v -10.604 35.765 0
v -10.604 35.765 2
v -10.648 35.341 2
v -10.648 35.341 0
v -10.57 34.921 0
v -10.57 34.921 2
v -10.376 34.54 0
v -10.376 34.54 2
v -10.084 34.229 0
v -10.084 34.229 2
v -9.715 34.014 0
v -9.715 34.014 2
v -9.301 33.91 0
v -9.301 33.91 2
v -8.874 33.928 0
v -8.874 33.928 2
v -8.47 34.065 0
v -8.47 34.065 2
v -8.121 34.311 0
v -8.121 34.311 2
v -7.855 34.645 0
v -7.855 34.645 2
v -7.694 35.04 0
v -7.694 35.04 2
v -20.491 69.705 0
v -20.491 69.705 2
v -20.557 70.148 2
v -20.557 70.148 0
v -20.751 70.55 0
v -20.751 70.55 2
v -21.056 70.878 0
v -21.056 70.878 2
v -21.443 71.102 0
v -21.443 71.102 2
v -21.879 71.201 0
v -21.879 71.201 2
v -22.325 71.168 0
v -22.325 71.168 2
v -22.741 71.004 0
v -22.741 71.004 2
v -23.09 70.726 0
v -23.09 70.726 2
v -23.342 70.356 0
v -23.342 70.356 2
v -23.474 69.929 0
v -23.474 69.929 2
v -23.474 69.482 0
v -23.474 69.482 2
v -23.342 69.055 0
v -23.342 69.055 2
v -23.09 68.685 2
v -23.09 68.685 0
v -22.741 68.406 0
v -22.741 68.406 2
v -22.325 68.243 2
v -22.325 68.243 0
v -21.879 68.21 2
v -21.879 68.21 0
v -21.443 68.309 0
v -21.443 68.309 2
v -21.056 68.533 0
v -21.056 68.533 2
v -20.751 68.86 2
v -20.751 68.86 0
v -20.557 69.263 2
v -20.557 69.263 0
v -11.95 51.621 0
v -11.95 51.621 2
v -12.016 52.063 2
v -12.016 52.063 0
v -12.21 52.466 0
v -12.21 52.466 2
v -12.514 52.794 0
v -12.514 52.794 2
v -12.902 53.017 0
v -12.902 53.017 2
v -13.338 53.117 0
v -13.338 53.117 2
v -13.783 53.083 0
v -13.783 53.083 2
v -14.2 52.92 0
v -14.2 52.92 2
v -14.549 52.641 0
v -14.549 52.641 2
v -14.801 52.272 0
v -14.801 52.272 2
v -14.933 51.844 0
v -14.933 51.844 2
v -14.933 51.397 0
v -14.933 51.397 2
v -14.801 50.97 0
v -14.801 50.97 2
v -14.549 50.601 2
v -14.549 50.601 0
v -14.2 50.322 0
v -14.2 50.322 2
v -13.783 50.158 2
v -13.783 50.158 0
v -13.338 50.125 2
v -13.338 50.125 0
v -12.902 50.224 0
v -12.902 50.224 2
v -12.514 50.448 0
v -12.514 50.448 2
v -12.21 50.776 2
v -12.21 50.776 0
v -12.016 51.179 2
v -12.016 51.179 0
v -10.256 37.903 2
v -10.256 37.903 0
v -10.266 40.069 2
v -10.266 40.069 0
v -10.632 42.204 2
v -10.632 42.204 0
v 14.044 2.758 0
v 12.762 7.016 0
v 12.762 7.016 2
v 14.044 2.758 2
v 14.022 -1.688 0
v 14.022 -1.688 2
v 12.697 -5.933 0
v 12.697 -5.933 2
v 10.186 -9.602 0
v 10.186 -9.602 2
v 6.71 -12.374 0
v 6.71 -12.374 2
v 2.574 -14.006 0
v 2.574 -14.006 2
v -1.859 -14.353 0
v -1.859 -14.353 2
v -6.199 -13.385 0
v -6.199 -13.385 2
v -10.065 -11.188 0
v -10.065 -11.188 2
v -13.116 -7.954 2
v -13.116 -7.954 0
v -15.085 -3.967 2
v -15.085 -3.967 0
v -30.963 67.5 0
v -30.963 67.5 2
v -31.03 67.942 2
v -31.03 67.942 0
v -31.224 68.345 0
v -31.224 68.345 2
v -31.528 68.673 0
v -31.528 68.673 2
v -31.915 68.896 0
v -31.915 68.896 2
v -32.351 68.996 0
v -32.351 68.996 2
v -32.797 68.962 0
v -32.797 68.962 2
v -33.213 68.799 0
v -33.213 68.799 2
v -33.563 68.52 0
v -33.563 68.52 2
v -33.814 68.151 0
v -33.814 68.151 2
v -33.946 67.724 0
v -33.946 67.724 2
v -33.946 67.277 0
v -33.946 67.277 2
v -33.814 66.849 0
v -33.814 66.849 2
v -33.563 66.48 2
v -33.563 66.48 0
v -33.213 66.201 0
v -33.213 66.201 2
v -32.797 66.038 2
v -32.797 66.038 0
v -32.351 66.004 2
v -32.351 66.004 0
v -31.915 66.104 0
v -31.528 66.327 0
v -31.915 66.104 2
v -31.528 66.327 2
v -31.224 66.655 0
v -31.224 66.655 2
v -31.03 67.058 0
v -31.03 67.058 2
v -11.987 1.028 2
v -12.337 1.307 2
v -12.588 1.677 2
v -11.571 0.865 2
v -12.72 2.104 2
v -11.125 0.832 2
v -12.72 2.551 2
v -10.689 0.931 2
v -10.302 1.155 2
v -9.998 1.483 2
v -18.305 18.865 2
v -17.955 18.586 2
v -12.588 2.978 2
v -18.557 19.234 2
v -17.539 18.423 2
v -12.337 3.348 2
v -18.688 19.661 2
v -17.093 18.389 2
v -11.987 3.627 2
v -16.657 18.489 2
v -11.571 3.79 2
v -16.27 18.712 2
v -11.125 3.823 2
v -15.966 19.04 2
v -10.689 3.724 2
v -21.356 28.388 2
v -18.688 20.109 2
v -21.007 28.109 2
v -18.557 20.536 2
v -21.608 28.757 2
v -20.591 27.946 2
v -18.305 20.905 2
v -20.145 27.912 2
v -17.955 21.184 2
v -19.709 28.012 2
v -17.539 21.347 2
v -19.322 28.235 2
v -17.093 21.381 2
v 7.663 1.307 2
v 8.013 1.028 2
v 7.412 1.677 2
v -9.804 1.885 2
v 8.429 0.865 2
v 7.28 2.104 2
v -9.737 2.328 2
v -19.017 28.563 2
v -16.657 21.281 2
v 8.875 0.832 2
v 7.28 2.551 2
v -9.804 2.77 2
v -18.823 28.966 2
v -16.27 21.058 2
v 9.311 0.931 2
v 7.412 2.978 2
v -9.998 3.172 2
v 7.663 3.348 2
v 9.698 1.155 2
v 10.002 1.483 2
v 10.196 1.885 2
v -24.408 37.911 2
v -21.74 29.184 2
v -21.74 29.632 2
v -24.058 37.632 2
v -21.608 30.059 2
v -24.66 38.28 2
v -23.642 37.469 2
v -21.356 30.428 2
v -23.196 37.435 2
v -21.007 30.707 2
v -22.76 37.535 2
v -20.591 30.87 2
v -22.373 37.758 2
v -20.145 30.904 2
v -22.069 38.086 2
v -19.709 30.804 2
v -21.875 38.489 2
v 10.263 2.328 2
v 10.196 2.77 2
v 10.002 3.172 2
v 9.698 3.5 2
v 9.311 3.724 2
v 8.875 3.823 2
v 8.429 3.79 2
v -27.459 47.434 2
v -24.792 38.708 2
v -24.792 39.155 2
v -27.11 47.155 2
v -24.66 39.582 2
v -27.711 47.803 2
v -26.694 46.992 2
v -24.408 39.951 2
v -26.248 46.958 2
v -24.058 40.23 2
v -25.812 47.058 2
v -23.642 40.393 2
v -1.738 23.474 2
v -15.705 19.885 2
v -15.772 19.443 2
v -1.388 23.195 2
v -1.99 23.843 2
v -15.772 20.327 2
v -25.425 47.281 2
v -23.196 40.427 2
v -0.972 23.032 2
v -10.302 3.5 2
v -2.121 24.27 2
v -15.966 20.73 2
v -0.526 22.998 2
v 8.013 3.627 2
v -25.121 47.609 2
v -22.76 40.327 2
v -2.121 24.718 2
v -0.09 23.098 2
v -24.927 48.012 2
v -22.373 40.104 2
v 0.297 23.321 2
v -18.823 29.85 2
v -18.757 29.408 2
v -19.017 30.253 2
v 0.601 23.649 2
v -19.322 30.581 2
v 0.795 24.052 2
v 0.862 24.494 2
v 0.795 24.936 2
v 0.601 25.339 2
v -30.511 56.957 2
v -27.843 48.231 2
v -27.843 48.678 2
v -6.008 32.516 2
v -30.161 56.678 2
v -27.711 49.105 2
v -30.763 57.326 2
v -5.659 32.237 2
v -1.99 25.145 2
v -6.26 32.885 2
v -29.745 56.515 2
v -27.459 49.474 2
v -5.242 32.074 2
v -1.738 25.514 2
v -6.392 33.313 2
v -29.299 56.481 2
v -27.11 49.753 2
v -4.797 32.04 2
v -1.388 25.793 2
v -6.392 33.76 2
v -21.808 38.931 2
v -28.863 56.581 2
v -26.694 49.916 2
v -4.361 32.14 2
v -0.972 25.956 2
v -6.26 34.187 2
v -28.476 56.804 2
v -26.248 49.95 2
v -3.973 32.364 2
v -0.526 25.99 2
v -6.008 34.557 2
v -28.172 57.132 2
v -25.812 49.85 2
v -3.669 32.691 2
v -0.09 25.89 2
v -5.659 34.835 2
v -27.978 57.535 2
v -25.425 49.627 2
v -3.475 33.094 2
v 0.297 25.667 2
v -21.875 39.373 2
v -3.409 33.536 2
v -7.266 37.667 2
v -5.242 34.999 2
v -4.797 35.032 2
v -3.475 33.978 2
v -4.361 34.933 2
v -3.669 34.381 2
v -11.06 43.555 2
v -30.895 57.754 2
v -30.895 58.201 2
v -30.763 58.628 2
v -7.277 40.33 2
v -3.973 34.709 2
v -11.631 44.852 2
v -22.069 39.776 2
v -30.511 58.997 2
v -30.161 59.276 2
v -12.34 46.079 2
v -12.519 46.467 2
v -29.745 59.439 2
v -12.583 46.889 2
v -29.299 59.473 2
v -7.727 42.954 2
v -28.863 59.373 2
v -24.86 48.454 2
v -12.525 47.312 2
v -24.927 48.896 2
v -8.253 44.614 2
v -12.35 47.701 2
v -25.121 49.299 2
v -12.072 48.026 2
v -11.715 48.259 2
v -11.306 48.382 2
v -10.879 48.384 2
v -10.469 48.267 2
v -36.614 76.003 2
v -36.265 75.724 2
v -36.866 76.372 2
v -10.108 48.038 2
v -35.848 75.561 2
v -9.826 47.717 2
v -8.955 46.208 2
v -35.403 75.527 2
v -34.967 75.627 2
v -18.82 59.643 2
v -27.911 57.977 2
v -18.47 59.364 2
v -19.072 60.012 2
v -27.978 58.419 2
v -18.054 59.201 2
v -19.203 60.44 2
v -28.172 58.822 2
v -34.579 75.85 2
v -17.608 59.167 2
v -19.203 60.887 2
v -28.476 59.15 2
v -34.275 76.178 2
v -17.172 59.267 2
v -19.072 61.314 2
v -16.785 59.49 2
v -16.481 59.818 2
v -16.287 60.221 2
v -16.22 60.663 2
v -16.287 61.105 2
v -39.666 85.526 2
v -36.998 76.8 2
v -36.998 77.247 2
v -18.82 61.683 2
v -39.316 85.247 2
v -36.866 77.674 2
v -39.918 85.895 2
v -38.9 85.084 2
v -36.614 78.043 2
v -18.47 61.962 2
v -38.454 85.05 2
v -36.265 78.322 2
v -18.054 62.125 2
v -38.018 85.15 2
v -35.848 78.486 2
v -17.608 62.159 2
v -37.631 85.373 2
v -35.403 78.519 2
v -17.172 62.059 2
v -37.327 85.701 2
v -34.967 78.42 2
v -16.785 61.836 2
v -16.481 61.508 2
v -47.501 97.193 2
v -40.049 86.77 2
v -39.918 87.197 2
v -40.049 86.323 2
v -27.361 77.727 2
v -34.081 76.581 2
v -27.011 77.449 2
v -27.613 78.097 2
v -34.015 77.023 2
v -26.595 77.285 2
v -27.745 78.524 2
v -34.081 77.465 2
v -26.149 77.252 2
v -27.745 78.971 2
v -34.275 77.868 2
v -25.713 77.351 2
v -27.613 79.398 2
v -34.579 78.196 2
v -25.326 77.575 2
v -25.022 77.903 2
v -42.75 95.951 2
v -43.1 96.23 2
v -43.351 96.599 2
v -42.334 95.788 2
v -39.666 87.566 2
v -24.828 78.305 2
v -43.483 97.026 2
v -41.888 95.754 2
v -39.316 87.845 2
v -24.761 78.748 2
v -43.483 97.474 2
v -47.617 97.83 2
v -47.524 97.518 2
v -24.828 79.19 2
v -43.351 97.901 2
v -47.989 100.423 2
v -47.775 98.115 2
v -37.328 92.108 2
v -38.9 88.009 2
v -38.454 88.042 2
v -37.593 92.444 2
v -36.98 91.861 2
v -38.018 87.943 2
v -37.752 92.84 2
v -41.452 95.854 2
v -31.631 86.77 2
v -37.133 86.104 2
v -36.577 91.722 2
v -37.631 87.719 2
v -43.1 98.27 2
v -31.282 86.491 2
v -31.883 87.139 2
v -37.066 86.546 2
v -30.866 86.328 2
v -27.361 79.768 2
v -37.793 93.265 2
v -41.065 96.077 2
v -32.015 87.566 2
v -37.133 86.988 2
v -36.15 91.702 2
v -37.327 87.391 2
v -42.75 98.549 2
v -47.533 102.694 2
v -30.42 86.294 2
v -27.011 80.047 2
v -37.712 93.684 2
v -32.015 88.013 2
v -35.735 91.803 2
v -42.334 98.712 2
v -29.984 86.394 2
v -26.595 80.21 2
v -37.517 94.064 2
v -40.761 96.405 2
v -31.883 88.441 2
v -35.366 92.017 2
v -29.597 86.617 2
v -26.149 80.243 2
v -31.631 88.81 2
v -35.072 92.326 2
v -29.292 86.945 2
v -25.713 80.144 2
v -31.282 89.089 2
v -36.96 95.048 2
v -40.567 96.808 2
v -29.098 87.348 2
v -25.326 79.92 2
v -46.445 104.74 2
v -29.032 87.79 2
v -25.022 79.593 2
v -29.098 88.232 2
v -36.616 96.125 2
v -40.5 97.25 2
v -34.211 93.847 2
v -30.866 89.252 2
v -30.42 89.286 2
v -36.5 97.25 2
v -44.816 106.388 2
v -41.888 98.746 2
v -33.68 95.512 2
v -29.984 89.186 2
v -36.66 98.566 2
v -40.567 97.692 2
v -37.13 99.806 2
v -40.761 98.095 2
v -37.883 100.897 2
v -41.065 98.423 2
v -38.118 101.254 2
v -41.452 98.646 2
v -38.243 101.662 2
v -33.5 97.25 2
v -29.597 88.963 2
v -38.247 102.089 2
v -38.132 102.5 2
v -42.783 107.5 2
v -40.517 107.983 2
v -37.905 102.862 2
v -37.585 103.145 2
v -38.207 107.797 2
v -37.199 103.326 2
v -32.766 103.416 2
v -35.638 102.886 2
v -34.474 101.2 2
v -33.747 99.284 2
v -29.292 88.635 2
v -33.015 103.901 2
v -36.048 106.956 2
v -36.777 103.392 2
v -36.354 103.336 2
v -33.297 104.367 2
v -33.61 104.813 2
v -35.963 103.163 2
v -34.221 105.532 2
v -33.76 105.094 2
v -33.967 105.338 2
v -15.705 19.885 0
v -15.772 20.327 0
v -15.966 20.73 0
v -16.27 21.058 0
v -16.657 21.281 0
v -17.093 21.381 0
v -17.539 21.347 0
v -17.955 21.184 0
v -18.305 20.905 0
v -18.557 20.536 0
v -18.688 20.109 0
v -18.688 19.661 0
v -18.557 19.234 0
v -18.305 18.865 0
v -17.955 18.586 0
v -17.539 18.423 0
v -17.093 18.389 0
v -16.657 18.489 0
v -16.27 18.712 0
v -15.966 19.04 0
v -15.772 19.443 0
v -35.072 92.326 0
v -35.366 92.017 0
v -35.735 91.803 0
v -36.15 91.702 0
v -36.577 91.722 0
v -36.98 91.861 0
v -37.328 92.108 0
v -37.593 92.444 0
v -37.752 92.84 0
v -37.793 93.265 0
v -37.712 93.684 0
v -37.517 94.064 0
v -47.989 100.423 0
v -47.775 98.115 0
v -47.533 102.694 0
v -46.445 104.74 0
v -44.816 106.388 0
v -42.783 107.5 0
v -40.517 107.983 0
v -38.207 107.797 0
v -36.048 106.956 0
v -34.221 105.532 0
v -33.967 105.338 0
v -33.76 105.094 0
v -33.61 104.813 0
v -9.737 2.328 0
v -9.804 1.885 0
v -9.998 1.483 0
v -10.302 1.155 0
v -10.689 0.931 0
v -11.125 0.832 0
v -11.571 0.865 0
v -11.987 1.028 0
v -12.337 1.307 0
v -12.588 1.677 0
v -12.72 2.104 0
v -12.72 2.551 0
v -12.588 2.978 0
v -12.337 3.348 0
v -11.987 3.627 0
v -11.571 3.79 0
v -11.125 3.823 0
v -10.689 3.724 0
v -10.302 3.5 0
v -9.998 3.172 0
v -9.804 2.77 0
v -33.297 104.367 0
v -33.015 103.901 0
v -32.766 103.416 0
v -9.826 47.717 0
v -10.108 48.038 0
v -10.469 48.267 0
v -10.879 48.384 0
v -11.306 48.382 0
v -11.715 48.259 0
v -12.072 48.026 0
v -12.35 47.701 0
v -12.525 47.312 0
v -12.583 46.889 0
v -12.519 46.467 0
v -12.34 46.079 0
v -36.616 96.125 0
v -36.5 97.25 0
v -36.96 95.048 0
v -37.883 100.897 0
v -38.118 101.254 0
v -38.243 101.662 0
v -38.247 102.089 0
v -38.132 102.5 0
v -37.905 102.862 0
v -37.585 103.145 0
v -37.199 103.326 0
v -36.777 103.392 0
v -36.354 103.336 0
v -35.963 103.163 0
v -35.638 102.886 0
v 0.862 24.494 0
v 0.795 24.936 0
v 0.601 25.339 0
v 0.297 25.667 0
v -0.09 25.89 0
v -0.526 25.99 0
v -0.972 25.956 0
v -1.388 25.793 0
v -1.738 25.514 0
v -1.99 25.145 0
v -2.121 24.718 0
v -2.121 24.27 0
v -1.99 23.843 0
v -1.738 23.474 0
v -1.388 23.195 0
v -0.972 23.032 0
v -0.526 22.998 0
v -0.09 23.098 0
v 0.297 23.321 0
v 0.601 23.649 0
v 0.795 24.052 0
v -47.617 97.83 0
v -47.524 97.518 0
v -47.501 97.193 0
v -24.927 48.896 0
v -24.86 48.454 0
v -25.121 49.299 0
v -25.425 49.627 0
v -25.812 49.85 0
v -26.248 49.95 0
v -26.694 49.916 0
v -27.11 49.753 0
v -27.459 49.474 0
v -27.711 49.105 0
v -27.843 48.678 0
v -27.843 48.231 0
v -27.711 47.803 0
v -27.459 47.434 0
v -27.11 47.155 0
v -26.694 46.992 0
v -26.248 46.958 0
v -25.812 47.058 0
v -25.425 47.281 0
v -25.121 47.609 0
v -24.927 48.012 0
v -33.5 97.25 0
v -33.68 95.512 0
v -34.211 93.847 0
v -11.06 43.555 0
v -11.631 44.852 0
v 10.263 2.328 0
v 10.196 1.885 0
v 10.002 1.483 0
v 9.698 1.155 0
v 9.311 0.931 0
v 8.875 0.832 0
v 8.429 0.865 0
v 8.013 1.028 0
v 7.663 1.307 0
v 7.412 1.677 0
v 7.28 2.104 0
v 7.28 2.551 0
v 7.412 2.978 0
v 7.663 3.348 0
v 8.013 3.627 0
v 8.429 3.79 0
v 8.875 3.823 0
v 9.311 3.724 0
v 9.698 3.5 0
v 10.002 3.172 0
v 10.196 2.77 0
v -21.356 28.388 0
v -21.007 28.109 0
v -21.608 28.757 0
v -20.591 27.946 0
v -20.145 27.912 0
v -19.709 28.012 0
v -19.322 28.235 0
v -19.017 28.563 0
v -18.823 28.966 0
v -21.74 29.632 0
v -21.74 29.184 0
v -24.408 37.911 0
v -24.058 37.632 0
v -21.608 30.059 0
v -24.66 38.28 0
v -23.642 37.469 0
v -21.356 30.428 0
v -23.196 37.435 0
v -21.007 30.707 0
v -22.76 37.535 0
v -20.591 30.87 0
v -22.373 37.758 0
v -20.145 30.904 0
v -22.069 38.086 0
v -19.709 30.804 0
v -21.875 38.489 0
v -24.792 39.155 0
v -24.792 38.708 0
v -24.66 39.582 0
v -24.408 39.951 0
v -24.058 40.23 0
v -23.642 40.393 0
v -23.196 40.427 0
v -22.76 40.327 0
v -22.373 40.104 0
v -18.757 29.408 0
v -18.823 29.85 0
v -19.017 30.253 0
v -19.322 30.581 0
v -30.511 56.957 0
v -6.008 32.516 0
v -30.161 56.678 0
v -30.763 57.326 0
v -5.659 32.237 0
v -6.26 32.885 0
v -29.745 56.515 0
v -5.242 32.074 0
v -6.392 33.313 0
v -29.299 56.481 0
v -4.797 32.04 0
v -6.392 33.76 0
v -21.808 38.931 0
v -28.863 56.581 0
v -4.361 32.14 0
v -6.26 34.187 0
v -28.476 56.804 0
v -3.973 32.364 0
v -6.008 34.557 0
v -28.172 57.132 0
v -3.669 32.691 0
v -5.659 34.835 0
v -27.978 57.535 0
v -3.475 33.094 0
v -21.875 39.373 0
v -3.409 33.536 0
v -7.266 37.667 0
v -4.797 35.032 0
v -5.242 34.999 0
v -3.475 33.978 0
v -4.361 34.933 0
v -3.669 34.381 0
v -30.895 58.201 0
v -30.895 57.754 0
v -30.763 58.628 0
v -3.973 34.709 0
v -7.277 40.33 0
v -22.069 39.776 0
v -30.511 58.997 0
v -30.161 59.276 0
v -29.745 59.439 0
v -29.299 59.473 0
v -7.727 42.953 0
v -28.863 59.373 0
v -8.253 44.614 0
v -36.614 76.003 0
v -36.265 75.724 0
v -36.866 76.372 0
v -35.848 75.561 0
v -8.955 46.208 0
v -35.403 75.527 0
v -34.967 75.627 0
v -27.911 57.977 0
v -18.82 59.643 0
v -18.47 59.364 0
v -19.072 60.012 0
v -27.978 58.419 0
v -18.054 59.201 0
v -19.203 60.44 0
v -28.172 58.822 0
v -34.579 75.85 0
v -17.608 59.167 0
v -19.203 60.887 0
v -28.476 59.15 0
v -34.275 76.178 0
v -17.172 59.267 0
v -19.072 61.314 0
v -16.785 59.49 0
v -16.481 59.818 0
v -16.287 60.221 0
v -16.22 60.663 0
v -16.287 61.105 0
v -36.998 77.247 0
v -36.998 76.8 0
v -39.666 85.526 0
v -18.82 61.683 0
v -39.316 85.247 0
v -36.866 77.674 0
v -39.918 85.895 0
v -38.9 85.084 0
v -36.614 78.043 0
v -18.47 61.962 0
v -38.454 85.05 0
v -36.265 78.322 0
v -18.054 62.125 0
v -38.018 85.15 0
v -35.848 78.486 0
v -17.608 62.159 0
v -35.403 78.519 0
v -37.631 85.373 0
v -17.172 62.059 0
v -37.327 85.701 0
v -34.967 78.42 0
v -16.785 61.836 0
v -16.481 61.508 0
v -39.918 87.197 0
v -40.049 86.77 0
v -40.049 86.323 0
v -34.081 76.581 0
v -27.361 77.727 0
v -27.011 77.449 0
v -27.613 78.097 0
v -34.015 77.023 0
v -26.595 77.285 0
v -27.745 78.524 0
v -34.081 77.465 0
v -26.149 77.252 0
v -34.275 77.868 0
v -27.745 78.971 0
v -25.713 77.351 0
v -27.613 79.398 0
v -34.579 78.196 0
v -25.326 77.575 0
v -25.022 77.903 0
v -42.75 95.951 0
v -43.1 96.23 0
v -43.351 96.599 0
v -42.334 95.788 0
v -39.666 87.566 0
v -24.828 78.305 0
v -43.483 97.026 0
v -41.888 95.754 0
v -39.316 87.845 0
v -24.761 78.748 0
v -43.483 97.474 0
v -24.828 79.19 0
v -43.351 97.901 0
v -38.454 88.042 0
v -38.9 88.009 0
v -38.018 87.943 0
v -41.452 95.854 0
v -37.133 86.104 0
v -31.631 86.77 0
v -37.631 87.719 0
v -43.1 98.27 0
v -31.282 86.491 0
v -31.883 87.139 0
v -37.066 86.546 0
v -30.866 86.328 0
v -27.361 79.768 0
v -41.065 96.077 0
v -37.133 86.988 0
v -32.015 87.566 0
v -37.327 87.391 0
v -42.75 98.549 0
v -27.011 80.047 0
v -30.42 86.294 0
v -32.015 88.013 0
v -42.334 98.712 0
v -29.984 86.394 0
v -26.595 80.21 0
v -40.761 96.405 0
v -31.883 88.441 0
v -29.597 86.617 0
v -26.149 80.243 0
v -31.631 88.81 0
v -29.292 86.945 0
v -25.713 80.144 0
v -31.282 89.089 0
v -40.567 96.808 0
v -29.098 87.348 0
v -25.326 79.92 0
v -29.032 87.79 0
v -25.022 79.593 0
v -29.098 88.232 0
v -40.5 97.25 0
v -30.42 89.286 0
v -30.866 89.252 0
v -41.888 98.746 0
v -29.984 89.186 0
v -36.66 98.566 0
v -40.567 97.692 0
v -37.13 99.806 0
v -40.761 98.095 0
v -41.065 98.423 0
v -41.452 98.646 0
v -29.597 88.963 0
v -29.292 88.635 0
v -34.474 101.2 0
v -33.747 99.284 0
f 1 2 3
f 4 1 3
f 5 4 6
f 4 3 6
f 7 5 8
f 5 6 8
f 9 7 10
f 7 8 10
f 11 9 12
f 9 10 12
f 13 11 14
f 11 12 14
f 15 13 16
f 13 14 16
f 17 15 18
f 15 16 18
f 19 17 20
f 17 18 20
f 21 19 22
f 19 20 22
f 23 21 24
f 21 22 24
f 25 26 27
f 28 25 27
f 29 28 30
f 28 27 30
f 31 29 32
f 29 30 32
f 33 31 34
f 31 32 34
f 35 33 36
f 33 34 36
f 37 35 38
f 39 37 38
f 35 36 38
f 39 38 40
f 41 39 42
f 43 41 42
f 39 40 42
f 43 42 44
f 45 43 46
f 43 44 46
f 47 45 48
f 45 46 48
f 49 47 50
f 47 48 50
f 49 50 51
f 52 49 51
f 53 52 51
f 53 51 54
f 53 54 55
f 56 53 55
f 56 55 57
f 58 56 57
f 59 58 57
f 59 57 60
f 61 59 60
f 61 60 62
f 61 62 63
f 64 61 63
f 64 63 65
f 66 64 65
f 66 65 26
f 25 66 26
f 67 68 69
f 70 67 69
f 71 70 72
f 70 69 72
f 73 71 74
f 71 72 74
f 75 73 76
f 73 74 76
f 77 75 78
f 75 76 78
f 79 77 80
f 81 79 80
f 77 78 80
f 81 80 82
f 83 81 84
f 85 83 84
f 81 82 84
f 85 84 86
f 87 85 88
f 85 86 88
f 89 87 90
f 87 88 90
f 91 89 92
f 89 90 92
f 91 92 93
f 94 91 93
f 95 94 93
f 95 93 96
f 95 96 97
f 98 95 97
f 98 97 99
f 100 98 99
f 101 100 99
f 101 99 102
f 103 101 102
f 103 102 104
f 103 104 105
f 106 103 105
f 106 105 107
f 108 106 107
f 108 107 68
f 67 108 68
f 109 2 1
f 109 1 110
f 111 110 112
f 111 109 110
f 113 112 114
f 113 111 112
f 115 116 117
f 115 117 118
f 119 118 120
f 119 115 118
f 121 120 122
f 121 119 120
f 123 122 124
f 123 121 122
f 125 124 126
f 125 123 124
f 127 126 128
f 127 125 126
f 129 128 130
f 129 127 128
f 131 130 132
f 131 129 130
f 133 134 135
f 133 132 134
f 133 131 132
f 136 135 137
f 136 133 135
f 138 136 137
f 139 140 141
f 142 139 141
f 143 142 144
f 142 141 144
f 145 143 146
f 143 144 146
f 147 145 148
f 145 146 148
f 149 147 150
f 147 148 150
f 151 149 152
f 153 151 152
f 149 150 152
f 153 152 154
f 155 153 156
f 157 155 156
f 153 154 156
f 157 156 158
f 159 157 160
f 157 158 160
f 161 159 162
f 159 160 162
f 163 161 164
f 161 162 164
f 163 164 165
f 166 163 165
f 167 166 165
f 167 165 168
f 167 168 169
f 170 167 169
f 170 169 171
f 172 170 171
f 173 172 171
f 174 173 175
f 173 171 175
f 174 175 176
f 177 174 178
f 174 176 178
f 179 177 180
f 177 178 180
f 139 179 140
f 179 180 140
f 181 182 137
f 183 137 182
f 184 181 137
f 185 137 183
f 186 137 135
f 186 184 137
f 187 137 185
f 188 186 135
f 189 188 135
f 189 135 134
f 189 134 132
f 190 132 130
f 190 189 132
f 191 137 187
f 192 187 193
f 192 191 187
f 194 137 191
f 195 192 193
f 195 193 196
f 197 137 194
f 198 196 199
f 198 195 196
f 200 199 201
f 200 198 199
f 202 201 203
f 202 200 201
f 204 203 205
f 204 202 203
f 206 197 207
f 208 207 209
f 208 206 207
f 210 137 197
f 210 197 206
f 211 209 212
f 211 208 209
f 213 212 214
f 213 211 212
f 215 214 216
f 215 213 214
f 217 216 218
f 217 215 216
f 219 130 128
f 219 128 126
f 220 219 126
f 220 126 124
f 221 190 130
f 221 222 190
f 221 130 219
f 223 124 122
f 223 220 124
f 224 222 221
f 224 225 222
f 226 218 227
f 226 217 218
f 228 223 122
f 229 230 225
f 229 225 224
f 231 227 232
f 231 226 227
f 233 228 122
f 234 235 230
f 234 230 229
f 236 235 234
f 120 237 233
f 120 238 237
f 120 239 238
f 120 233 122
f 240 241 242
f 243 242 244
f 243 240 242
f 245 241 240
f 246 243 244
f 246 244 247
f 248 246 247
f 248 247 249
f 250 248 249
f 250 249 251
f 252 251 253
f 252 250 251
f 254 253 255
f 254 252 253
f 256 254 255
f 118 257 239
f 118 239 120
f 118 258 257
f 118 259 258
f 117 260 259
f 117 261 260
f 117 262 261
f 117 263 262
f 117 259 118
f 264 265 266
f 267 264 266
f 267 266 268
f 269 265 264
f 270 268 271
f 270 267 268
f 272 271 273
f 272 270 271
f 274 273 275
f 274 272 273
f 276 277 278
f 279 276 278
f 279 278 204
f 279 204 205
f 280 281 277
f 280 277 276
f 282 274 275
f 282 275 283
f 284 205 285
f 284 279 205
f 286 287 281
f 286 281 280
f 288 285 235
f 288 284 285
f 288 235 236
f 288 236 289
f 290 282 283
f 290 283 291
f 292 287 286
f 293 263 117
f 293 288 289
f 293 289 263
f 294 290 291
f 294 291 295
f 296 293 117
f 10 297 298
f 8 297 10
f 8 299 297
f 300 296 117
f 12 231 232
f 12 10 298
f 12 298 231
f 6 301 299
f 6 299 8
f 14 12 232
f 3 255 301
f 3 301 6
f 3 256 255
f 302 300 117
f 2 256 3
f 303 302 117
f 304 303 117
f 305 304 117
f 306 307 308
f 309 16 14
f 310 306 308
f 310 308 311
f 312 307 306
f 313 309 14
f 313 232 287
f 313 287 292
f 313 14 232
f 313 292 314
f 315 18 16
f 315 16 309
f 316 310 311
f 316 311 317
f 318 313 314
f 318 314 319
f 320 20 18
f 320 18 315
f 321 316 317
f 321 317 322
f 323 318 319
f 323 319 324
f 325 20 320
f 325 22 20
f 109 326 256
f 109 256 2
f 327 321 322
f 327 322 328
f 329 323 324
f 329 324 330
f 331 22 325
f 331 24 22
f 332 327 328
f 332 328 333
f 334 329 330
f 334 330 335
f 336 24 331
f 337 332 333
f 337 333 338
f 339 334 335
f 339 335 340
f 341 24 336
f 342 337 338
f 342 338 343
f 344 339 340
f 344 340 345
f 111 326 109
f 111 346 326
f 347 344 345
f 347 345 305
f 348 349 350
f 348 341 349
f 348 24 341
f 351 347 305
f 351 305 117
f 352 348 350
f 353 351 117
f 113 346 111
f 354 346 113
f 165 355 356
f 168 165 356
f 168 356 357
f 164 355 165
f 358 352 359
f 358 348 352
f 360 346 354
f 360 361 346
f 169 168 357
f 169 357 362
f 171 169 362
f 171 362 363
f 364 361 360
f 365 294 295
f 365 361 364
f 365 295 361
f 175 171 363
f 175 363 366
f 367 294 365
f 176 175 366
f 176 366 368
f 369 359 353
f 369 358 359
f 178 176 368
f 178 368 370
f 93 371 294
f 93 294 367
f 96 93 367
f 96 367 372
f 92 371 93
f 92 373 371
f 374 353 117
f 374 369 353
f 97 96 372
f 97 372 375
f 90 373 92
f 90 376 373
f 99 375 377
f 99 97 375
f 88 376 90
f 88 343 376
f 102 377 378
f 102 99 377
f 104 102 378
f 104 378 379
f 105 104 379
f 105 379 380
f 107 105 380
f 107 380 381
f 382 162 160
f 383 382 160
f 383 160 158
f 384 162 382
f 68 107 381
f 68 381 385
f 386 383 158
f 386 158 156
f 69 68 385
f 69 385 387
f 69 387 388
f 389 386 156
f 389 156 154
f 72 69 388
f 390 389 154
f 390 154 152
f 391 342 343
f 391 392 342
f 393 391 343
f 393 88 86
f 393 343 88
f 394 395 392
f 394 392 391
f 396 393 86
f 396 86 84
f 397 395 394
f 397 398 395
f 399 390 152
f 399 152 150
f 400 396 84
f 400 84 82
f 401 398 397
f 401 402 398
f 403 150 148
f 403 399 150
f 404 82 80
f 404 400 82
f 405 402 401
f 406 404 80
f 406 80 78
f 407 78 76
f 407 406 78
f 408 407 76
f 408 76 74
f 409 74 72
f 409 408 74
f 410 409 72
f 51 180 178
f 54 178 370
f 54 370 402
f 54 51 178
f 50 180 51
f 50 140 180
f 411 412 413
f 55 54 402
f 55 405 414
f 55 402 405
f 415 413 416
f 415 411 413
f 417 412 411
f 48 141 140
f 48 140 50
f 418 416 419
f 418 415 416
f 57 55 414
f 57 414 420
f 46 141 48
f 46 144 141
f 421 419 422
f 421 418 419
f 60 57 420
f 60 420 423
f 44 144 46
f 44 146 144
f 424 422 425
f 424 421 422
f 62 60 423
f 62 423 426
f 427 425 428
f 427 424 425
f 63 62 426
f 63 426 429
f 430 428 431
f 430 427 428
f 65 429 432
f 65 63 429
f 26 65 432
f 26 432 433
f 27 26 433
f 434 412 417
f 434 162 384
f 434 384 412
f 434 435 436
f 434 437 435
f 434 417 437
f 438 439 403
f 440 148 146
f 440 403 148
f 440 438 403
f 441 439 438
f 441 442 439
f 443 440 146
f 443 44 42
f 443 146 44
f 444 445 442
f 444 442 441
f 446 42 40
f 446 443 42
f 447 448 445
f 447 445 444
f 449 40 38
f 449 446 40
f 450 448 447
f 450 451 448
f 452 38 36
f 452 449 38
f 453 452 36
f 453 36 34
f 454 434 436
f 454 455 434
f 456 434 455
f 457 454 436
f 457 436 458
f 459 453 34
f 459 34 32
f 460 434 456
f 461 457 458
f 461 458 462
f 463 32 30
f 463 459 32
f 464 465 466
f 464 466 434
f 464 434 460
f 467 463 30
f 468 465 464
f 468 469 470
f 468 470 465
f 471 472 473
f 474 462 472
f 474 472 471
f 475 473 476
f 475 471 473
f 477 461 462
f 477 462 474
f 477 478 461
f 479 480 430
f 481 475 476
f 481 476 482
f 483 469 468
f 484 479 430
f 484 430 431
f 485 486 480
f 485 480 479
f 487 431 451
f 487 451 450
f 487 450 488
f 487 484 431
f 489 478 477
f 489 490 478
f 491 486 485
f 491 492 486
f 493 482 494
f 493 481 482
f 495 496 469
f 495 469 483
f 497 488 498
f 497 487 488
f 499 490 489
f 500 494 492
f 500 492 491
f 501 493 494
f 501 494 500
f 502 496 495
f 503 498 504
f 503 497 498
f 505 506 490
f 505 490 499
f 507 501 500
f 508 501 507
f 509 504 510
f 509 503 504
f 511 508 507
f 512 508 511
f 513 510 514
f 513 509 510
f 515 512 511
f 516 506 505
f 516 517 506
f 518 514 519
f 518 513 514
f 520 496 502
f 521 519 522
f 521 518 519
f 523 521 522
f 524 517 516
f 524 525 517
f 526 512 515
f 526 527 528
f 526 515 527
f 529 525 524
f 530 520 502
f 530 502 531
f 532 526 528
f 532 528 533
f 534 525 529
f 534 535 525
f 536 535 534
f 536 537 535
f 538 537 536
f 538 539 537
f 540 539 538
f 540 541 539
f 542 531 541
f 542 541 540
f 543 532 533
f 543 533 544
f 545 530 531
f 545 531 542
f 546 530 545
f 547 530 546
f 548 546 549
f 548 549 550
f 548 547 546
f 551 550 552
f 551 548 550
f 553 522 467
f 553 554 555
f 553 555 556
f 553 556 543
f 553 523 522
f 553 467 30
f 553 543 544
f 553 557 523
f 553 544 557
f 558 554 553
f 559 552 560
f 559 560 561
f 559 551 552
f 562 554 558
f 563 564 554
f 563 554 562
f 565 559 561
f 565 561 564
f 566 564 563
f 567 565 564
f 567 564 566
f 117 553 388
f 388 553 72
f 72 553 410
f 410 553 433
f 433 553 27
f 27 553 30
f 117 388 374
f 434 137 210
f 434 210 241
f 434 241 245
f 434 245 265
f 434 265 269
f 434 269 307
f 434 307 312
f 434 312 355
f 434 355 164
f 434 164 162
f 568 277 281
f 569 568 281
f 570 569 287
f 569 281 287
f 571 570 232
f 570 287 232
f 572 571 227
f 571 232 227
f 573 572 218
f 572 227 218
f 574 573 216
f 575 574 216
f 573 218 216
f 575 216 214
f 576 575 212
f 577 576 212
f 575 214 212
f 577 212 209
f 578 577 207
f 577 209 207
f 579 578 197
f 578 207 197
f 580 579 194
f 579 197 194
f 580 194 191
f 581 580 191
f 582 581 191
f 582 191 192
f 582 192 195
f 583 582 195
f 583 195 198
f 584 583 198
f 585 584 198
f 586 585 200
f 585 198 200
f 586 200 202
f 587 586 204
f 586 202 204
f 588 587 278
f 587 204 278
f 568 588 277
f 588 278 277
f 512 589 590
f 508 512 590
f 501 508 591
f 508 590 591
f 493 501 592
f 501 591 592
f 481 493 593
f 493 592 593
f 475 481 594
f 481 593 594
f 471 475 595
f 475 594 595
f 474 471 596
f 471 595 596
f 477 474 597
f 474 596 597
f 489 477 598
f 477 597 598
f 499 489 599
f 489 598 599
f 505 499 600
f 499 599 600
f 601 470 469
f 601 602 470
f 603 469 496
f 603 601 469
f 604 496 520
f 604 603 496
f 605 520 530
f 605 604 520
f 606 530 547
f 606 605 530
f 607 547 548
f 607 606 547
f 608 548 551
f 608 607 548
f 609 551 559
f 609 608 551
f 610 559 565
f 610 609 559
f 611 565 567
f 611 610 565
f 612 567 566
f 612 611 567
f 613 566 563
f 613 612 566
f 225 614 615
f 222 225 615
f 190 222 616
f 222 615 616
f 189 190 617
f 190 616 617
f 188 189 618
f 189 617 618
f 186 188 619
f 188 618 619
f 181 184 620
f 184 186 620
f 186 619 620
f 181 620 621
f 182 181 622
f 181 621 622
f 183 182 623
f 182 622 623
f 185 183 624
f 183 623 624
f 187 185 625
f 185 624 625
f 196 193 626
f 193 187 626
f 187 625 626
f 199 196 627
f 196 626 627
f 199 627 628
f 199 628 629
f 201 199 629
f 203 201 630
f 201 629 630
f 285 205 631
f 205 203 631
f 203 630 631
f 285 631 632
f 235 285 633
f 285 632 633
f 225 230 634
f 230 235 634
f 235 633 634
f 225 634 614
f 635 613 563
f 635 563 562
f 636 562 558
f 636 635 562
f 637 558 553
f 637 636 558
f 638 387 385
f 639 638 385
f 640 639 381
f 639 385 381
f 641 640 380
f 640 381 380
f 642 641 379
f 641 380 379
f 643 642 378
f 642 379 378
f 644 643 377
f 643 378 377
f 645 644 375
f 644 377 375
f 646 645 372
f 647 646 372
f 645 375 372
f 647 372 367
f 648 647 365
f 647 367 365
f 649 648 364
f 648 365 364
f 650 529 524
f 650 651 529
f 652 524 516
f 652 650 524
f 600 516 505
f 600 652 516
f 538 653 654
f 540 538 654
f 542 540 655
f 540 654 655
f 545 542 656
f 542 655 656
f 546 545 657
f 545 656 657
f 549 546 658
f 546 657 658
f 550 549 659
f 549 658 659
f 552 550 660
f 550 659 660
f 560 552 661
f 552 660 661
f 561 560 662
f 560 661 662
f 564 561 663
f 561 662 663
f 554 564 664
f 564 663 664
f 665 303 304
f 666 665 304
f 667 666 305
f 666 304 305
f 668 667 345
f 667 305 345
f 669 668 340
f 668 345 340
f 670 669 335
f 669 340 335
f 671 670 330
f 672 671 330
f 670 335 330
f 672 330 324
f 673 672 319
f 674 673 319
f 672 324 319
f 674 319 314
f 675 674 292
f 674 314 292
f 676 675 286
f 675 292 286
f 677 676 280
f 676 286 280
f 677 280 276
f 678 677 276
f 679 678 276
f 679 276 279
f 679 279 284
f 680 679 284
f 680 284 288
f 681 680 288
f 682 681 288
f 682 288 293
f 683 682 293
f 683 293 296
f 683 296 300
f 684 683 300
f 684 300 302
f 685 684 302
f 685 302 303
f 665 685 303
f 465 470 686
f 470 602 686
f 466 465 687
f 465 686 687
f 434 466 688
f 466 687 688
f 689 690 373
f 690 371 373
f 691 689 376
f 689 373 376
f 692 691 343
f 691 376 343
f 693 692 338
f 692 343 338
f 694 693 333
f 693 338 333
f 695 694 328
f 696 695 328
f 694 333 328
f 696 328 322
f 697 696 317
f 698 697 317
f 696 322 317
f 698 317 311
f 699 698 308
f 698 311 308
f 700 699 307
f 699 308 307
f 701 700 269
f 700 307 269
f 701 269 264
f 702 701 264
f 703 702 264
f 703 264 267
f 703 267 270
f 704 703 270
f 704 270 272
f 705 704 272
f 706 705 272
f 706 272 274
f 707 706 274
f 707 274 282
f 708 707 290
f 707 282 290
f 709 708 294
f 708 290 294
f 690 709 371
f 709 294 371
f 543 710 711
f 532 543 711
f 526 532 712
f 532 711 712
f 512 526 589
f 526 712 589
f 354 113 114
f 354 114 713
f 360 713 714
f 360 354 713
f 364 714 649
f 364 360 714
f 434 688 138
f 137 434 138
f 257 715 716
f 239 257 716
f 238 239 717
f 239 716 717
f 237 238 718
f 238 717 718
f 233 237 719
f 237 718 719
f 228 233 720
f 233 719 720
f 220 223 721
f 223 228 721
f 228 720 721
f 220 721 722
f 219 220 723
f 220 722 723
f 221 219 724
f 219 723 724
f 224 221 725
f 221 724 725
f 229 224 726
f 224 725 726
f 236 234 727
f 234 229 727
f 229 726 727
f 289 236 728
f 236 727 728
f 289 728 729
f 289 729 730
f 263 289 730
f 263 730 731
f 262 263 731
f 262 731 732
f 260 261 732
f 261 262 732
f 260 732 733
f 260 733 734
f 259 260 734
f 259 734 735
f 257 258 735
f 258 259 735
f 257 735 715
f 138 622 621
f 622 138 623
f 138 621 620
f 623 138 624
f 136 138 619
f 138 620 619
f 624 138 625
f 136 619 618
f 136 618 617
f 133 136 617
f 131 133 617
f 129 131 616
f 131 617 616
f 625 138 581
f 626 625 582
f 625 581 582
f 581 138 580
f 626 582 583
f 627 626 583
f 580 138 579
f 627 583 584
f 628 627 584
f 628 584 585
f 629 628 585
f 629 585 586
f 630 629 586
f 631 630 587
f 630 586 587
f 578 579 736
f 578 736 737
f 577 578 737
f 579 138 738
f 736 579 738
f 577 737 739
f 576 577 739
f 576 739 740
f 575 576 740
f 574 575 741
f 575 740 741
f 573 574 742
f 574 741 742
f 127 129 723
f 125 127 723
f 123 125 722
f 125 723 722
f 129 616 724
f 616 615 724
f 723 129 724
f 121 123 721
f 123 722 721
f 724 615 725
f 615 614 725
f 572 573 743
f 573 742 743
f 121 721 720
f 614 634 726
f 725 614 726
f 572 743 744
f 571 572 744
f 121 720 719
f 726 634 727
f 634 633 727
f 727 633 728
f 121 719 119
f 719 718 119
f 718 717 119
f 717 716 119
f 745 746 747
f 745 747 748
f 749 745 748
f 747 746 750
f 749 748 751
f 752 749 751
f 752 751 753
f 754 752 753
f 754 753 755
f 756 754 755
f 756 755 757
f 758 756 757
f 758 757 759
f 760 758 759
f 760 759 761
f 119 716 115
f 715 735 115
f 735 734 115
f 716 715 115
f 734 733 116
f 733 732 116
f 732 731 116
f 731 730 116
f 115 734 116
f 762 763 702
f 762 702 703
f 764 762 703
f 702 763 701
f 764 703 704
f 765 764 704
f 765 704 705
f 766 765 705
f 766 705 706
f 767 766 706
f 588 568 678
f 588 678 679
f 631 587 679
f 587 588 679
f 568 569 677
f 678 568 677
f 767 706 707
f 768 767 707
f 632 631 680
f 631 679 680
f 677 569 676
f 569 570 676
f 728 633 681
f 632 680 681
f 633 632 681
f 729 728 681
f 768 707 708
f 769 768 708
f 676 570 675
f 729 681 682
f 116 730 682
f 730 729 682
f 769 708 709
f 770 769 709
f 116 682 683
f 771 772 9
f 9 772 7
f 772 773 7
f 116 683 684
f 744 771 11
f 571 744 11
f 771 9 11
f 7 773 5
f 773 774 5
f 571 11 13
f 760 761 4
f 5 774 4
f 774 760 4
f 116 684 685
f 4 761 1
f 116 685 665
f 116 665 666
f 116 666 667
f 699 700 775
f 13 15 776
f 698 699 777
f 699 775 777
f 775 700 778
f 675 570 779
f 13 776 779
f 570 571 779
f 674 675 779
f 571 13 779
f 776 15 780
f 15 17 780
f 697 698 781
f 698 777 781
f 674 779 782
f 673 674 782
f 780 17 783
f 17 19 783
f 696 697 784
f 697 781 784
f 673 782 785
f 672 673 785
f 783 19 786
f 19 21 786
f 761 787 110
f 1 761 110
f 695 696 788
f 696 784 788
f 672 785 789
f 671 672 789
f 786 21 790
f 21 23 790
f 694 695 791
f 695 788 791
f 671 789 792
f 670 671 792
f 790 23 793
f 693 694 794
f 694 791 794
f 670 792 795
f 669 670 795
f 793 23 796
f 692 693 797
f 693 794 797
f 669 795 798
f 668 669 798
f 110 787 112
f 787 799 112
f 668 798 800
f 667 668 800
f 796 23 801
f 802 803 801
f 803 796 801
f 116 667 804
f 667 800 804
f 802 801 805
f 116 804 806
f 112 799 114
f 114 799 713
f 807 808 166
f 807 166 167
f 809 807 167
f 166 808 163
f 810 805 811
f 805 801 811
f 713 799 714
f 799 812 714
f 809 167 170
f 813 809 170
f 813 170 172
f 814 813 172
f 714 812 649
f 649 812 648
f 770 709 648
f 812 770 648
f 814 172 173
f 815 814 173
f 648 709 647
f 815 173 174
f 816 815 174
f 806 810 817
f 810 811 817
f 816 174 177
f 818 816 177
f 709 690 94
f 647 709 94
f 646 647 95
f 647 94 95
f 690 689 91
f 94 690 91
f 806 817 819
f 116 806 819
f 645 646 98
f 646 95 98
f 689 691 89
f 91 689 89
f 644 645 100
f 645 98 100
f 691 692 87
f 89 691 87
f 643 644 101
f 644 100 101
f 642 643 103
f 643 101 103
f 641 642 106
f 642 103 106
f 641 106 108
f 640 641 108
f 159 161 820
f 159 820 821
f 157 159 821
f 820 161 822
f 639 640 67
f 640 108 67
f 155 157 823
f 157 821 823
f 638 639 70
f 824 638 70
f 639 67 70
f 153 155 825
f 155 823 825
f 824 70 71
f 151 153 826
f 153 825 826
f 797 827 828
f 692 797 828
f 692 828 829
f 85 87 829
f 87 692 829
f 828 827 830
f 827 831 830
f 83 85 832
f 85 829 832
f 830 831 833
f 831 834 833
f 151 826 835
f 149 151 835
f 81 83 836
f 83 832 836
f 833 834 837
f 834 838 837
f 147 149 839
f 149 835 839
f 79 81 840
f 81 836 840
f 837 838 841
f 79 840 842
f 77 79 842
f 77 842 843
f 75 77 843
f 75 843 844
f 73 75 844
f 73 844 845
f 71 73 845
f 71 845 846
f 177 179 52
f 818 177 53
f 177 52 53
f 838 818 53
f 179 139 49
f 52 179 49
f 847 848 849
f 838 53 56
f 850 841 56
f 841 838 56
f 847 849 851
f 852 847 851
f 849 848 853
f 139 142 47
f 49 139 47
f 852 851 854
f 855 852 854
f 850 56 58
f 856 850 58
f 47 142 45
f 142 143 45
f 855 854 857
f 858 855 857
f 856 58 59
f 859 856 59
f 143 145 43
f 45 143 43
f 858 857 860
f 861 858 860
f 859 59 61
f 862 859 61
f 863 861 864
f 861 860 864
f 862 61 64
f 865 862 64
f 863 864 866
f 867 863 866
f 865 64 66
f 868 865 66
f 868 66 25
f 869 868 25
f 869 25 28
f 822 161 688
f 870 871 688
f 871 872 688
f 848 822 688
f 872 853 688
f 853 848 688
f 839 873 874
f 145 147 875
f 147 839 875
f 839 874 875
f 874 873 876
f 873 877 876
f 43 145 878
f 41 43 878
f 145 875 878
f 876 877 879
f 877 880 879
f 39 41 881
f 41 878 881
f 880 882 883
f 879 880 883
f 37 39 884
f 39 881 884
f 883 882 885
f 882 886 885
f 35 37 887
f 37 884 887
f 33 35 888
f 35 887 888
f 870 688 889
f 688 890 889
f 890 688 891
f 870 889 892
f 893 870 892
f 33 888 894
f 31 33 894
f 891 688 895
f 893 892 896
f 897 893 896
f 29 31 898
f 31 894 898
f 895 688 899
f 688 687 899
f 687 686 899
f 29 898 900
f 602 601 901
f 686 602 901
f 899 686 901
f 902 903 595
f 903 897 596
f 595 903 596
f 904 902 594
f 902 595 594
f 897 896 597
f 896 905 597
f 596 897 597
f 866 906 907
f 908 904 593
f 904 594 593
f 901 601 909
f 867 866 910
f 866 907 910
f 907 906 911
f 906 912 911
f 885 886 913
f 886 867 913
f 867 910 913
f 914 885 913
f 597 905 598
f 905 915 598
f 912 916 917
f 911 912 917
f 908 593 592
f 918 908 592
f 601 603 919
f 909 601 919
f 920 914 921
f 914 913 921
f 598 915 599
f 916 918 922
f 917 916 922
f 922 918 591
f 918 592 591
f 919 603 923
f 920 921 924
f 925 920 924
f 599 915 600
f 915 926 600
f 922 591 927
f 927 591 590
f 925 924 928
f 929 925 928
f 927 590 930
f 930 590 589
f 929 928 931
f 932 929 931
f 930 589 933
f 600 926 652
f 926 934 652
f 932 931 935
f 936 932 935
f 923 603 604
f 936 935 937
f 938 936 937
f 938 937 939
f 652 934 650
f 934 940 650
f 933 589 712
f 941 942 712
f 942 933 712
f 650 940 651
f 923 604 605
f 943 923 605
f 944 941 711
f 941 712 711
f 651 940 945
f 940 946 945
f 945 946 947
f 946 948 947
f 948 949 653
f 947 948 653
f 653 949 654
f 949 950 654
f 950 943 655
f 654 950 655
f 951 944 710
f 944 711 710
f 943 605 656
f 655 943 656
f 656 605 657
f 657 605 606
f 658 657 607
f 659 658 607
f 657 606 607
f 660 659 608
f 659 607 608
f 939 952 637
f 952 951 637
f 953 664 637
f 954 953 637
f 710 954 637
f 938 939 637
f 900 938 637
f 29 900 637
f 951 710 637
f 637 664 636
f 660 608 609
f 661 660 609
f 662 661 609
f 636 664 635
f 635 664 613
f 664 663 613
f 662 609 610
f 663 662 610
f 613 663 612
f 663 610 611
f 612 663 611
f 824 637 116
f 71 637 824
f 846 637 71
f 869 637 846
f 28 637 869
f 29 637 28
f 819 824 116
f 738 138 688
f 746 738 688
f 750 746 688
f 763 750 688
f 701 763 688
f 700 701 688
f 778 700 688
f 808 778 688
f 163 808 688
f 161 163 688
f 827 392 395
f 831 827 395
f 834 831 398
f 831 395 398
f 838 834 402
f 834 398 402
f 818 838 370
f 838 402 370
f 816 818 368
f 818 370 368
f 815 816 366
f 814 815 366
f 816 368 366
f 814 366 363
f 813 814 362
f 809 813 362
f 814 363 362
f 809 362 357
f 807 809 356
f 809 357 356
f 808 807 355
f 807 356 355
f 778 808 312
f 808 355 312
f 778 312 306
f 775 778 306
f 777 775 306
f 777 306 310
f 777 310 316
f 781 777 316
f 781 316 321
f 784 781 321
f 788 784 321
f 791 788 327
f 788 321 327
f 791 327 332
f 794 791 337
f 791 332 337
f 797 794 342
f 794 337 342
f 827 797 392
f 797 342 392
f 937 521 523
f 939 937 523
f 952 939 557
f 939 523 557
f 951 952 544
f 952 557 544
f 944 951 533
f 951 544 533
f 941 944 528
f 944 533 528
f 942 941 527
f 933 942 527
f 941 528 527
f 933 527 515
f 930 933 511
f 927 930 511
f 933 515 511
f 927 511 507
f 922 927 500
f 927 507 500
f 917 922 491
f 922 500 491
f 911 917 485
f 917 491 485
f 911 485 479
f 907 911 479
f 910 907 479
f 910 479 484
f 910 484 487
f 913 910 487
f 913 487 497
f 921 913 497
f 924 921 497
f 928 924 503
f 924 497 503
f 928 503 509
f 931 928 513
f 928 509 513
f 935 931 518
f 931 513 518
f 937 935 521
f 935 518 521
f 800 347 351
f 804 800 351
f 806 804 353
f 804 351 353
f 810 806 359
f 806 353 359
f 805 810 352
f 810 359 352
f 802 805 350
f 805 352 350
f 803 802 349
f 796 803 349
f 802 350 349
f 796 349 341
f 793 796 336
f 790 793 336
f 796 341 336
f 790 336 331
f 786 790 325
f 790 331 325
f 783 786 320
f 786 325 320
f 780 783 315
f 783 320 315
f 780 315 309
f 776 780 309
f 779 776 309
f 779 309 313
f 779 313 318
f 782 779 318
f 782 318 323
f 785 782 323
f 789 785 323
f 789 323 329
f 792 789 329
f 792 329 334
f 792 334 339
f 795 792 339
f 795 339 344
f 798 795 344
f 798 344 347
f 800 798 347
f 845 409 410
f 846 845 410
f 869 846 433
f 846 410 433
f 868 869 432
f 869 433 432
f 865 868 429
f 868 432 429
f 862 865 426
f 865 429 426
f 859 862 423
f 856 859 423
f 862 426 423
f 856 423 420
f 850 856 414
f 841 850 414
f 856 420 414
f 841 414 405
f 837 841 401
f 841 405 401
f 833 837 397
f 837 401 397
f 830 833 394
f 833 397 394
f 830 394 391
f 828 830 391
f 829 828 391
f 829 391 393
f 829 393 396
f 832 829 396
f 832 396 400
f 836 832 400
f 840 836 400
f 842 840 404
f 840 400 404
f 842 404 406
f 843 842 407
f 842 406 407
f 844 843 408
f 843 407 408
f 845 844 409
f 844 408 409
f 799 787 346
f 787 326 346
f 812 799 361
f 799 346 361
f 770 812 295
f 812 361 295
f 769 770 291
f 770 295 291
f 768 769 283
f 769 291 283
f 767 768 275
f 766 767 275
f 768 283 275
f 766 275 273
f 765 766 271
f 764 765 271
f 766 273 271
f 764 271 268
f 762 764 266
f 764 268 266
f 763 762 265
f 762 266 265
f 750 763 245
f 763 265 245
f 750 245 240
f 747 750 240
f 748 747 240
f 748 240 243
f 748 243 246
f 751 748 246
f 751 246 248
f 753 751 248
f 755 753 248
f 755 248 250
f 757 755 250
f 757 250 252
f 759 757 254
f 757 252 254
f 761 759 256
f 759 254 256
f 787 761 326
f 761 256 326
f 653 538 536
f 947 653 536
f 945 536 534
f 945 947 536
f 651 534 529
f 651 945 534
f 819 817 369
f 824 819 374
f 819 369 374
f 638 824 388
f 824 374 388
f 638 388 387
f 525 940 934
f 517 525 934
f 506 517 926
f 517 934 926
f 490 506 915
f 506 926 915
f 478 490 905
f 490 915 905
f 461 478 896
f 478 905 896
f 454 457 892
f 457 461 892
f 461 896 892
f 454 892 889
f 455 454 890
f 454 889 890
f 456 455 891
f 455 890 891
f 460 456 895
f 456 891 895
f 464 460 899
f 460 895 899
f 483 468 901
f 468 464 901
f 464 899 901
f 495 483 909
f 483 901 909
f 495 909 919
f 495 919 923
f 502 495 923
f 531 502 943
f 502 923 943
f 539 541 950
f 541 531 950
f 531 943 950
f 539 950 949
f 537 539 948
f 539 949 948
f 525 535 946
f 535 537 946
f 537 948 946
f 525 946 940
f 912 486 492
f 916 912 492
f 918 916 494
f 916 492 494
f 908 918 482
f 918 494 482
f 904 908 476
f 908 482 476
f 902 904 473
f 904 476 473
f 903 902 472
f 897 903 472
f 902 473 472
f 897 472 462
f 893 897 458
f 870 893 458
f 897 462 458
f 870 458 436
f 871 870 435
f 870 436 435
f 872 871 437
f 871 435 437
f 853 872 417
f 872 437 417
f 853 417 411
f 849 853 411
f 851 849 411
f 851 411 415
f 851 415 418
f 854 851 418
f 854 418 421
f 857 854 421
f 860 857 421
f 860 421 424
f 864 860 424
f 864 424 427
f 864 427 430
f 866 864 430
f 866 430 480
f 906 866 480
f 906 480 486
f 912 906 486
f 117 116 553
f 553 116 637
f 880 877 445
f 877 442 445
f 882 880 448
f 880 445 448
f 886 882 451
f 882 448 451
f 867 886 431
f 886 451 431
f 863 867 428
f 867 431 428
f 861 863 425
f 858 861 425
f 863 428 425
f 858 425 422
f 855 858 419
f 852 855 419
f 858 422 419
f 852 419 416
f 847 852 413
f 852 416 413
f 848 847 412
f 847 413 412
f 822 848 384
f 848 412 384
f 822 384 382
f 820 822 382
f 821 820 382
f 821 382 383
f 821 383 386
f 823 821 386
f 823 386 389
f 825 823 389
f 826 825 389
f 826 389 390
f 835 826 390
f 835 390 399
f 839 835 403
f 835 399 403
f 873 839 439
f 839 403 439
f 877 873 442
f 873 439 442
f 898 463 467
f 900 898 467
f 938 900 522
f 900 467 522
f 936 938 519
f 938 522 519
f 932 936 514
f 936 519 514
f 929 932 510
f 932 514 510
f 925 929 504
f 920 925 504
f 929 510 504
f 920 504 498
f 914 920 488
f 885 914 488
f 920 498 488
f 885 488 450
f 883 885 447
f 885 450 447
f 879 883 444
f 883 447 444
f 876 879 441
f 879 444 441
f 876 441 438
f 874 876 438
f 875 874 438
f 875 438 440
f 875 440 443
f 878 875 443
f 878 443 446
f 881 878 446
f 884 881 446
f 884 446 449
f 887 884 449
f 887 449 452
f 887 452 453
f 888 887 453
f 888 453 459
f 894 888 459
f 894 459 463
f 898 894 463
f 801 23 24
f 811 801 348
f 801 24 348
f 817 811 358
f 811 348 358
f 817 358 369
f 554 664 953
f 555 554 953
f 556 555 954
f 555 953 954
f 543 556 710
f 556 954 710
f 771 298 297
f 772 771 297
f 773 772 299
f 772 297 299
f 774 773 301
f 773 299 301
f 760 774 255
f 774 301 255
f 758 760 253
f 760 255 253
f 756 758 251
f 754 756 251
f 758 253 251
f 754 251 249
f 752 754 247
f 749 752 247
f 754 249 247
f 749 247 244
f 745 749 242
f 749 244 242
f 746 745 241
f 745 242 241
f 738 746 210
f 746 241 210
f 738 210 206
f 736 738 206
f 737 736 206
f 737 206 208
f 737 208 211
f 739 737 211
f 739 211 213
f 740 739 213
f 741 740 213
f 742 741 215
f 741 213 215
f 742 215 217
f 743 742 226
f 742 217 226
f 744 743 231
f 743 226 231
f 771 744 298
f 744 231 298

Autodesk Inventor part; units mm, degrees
ref_plane "YZ Plane" through (0, 0, 0) normal (1, 0, 0) x (0, 1, 0)
ref_plane "XZ Plane" through (0, 0, 0) normal (0, 1, 0) x (-1, 0, 0)
ref_plane "XY Plane" through (0, 0, 0) normal (0, 0, 1) x (1, 0, 0)
sketch "Эскиз1" plane through (0, 0, 0) normal (0, 0, 1) x (1, 0, 0)
  line L0 (15, -22.25) -> (15, 22.25) projected
  line L1 (15, 22.25) -> (-20, 22.25) projected
  line L2 (-20, 22.25) -> (-20, -22.25) projected
  line L3 (-20, -22.25) -> (15, -22.25) projected
  circle A0 centre (8.763, 2.3275) radius 1.5 projected
  circle A1 centre (8.763, 7.3275) radius 1.5 projected
  circle A2 centre (-11.237, -7.6725) radius 1.5 projected
  circle A3 centre (-11.237, -2.6725) radius 1.5 projected
  circle A4 centre (8.763, -2.6725) radius 1.5 projected
  circle A5 centre (8.763, -7.6725) radius 1.5 projected
  circle A6 centre (-11.237, 2.3275) radius 1.5 projected
  circle A7 centre (-11.237, 7.3275) radius 1.5 projected
  line L4 (-25, 92.25) -> (-62.0049, 92.25) projected
  line L5 (-103.637, 92.25) -> (-67.893, 92.25) projected
  circle A8 centre (-49, 104.25) radius 1.5 projected
  circle A9 centre (-42, 104.25) radius 1.5 projected
  circle A10 centre (-35, 104.25) radius 1.5 projected
  circle A11 centre (-35, 111.25) radius 1.5 projected
  circle A12 centre (-42, 118.25) radius 1.5 projected
  circle A13 centre (-49, 118.25) radius 1.5 projected
  circle A14 centre (-49, 111.25) radius 1.5 projected
  circle A15 centre (-35, 118.25) radius 1.5 projected
  circle A16 centre (-42, 111.25) radius 1.5 projected
  circle A17 centre (-42, 97.25) radius 1.5 projected
  circle A18 centre (-35, 97.25) radius 1.5 projected
  circle A19 centre (-49, 97.25) radius 1.5 projected
  line L6 (-25, 92.25) -> (-62.0049, 92.25) projected
  line L7 (-25, 95.25) -> (-25, 92.25) projected
  line L8 (-20, 95.25) -> (-25, 95.25) projected
  line L9 (-20, 95.25) -> (-20, 123.25) projected
  line L10 (-28, 123.25) -> (-20, 123.25) projected
  line L11 (-28, 129.25) -> (-28, 123.25) projected
  line L12 (-28, 129.25) -> (-62.0049, 129.25) projected
  line L13 (-62.0049, 92.25) -> (-62.0049, 129.25) projected
  line L14 (-5.1452, 11.625) -> (-40, 100) construction
  arc A20 (-32.5697, 102.9649) -> (-47.4303, 97.0351) centre (-40, 100) ccw
  line L15 (-5.1452, 11.625) -> (-22.5726, 55.8125) construction
  arc A21 (-13.8135, 8.0713) -> (-4.3725, 15.1785) centre (-0.8009, 0.6099) ccw
  line L16 (12.7625, 7.0157) -> (-32.7662, 103.4164)
  line L17 (-47.6184, 97.5588) -> (-15.0854, -3.9674)
  point P0 (0, 0)
  point P1 (-13.8589, 33.7187)
  point P2 (-33.6095, 104.8127)
  point P3 (-34.2206, 105.5316)
  point P4 (-47.7749, 98.1155)
  point P5 (-47.5011, 97.1926)
  dimension "d0" = 8
  dimension "d1" = 95
  dimension "d2" = 100
  dimension "d3" = 40
  dimension "d4" = 15
extrude "Выдавливание1" add sketch "Эскиз1" along normal blind 2 contours L16 A21 L17 L2 L1 | L1 L2 L17 L4 L16 | L4 L17 A19 A20 A10 L16 | A20 A10 | A10 A20 | A1 | A2 | A3 | A4 | A5 | A7 | A9
sketch "Эскиз2" plane through (0, 0, 2) normal (0, 0, 1) x (1, 0, 0)
  circle A0 centre (-38.5661, 86.5462) radius 1.5
  line L0 (-47.5011, 97.1926) -> (-15.0854, -3.9674) projected
  circle A1 centre (-35.5146, 77.0232) radius 1.5
  circle A2 centre (-32.463, 67.5001) radius 1.5
  circle A3 centre (-29.4114, 57.9771) radius 1.5
  circle A4 centre (-26.3599, 48.4541) radius 1.5
  circle A5 centre (-23.3083, 38.9311) radius 1.5
  circle A6 centre (-20.2568, 29.408) radius 1.5
  circle A7 centre (-17.2052, 19.885) radius 1.5
  circle A8 centre (-42, 97.25) radius 1.5 projected
  circle A9 centre (-11.237, 2.3275) radius 1.5 projected
  point P0 (0, 0)
  dimension "d7" = 3
  dimension "d10" = 10
  dimension "d17" = 5.2562
  dimension "d18" = 5.26
extrude "Выдавливание2" cut sketch "Эскиз2" against normal blind 3 contours A0 | A1 | A2 | A3 | A4 | A5 | A6 | A7
sketch "Эскиз3" plane through (0, 0, 2) normal (0, 0, 1) x (1, 0, 0)
  circle A0 centre (-35, 97.25) radius 1.5 projected
  line L0 (12.7625, 7.0157) -> (-32.7662, 103.4164) projected
  circle A1 centre (-30.5318, 87.7899) radius 1.5
  circle A2 centre (-26.2613, 78.7476) radius 1.5
  circle A3 centre (-21.9908, 69.7054) radius 1.5
  circle A4 centre (-17.7202, 60.6631) radius 1.5
  circle A5 centre (-13.4497, 51.6208) radius 1.5
  circle A6 centre (-9.1792, 42.5786) radius 1.5
  circle A7 centre (-4.9086, 33.5363) radius 1.5
  circle A8 centre (-0.6381, 24.494) radius 1.5
  point P0 (0, 0)
  dimension "d19" = 3
  dimension "d20" = 4.6533
  dimension "d21" = 4.653
  dimension "d24" = 10
extrude "Выдавливание3" cut sketch "Эскиз3" against normal blind 3 contours A1 | A2 | A3 | A4 | A5 | A6 | A7 | A8
sketch "Эскиз4" plane through (0, 0, 0) normal (0, 0, -1) x (-1, 0, 0)
  circle A0 centre (42, 97.25) radius 1.5 projected
  circle A1 centre (35, 97.25) radius 1.5 construction
  arc A2 (35, 97.25) -> (36.2942, 93.1949) centre (42, 97.25) ccw construction
  arc A3 (33.5, 97.25) -> (35.0715, 92.326) centre (42, 97.25) ccw
  arc A4 (36.5, 97.25) -> (37.5169, 94.0639) centre (42, 97.25) ccw
  arc A5 (36.5, 97.25) -> (33.5, 97.25) centre (35, 97.25) ccw construction
  arc A6 (35.0715, 92.326) -> (37.5169, 94.0639) centre (36.2942, 93.1949) ccw
  arc A7 (36.7604, 101.8918) -> (35.0715, 96.252) centre (42, 97.25) ccw construction
  arc A8 (35.6376, 102.8865) -> (33.5868, 96.0382) centre (42, 97.25) ccw
  arc A9 (37.8832, 100.8971) -> (36.5562, 96.4659) centre (42, 97.25) ccw
  arc A10 (37.8832, 100.8971) -> (35.6376, 102.8865) centre (36.7604, 101.8918) ccw
  arc A11 (33.5868, 96.0382) -> (36.5562, 96.4659) centre (35.0715, 96.252) ccw construction
  point P0 (0, 0)
extrude "Выдавливание4" cut sketch "Эскиз4" against normal blind 3 contours A8 A10 A9 A4 A6 A3
sketch "Эскиз5" plane through (0, 0, 2) normal (0, 0, 1) x (1, 0, 0)
  circle A0 centre (-42, 97.25) radius 1.5 projected
  circle A1 centre (-11.237, 2.3275) radius 1.5 projected
  circle A2 centre (8.763, 2.3275) radius 1.5 projected
  arc A3 (-15.0854, -3.9674) -> (12.7625, 7.0157) centre (-0.8009, 0.6099) ccw projected
  line L0 (12.7625, 7.0157) -> (-32.7662, 103.4164) projected
  arc A4 (-32.7662, 103.4164) -> (-33.6095, 104.8127) centre (-40, 100) ccw projected
  arc A5 (-33.6095, 104.8127) -> (-34.2206, 105.5316) centre (-35, 104.25) ccw projected
  arc A6 (-34.2206, 105.5316) -> (-47.7749, 98.1155) centre (-40, 100) ccw projected
  arc A7 (-47.5011, 97.1926) -> (-47.7749, 98.1155) centre (-49, 97.25) ccw projected
  line L1 (-47.5011, 97.1926) -> (-15.0854, -3.9674) projected
  circle A8 centre (-17.2052, 19.885) radius 1.5 projected
  circle A9 centre (-23.3083, 38.9311) radius 1.5 projected
  circle A10 centre (-38.5661, 86.5462) radius 1.5 projected
  circle A11 centre (-32.463, 67.5001) radius 1.5 projected
  circle A12 centre (-29.4114, 57.9771) radius 1.5 projected
  circle A13 centre (-35.5146, 77.0232) radius 1.5 projected
  circle A14 centre (-20.2568, 29.408) radius 1.5 projected
  circle A15 centre (-26.3599, 48.4541) radius 1.5 projected
  circle A16 centre (-0.6381, 24.494) radius 1.5 projected
  circle A17 centre (-26.2613, 78.7476) radius 1.5 projected
  circle A18 centre (-4.9086, 33.5363) radius 1.5 projected
  circle A19 centre (-13.4497, 51.6208) radius 1.5 projected
  circle A20 centre (-17.7202, 60.6631) radius 1.5 projected
  circle A21 centre (-9.1792, 42.5786) radius 1.5 projected
  circle A22 centre (-30.5318, 87.7899) radius 1.5 projected
  circle A23 centre (-21.9908, 69.7054) radius 1.5 projected
  circle A24 centre (-23.3083, 38.9311) radius 1.5 projected
  circle A25 centre (-9.1792, 42.5786) radius 1.5 projected
  arc A26 (-9.149, 35.4026) -> (-9.1792, 42.5786) centre (-23.3083, 38.9311) ccw construction
  arc A27 (-7.6935, 35.0399) -> (-7.7268, 42.9535) centre (-23.3083, 38.9311) ccw
  arc A28 (-10.6045, 35.7653) -> (-10.6316, 42.2036) centre (-23.3083, 38.9311) ccw
  arc A29 (-10.6045, 35.7653) -> (-7.6935, 35.0399) centre (-9.149, 35.4026) ccw
  arc A30 (-7.7268, 42.9535) -> (-10.6316, 42.2036) centre (-9.1792, 42.5786) ccw
  arc A31 (-9.1792, 42.5786) -> (-11.0829, 46.8983) centre (-23.3083, 38.9311) ccw construction
  arc A32 (-7.7268, 42.9535) -> (-9.8263, 47.7173) centre (-23.3083, 38.9311) ccw
  arc A33 (-10.6316, 42.2036) -> (-12.3396, 46.0794) centre (-23.3083, 38.9311) ccw
  arc A34 (-10.6316, 42.2036) -> (-7.7268, 42.9535) centre (-9.1792, 42.5786) ccw
  arc A35 (-9.8263, 47.7173) -> (-12.3396, 46.0794) centre (-11.0829, 46.8983) ccw
  point P0 (0, 0)
  point P1 (-10.6316, 42.2036)
  point P2 (-10.6316, 42.2036)
  point P3 (-10.6316, 42.2036)
  point P4 (-7.7268, 42.9535)
  point P5 (-7.7268, 42.9535)
  point P6 (-7.7268, 42.9535)
extrude "Выдавливание5" cut sketch "Эскиз5" against normal blind 3 contours A21 A27 A29 A28 | A21 A33 A35 A32
properties part number "ЛЦМК.30000.30.00.02 Штанга"
